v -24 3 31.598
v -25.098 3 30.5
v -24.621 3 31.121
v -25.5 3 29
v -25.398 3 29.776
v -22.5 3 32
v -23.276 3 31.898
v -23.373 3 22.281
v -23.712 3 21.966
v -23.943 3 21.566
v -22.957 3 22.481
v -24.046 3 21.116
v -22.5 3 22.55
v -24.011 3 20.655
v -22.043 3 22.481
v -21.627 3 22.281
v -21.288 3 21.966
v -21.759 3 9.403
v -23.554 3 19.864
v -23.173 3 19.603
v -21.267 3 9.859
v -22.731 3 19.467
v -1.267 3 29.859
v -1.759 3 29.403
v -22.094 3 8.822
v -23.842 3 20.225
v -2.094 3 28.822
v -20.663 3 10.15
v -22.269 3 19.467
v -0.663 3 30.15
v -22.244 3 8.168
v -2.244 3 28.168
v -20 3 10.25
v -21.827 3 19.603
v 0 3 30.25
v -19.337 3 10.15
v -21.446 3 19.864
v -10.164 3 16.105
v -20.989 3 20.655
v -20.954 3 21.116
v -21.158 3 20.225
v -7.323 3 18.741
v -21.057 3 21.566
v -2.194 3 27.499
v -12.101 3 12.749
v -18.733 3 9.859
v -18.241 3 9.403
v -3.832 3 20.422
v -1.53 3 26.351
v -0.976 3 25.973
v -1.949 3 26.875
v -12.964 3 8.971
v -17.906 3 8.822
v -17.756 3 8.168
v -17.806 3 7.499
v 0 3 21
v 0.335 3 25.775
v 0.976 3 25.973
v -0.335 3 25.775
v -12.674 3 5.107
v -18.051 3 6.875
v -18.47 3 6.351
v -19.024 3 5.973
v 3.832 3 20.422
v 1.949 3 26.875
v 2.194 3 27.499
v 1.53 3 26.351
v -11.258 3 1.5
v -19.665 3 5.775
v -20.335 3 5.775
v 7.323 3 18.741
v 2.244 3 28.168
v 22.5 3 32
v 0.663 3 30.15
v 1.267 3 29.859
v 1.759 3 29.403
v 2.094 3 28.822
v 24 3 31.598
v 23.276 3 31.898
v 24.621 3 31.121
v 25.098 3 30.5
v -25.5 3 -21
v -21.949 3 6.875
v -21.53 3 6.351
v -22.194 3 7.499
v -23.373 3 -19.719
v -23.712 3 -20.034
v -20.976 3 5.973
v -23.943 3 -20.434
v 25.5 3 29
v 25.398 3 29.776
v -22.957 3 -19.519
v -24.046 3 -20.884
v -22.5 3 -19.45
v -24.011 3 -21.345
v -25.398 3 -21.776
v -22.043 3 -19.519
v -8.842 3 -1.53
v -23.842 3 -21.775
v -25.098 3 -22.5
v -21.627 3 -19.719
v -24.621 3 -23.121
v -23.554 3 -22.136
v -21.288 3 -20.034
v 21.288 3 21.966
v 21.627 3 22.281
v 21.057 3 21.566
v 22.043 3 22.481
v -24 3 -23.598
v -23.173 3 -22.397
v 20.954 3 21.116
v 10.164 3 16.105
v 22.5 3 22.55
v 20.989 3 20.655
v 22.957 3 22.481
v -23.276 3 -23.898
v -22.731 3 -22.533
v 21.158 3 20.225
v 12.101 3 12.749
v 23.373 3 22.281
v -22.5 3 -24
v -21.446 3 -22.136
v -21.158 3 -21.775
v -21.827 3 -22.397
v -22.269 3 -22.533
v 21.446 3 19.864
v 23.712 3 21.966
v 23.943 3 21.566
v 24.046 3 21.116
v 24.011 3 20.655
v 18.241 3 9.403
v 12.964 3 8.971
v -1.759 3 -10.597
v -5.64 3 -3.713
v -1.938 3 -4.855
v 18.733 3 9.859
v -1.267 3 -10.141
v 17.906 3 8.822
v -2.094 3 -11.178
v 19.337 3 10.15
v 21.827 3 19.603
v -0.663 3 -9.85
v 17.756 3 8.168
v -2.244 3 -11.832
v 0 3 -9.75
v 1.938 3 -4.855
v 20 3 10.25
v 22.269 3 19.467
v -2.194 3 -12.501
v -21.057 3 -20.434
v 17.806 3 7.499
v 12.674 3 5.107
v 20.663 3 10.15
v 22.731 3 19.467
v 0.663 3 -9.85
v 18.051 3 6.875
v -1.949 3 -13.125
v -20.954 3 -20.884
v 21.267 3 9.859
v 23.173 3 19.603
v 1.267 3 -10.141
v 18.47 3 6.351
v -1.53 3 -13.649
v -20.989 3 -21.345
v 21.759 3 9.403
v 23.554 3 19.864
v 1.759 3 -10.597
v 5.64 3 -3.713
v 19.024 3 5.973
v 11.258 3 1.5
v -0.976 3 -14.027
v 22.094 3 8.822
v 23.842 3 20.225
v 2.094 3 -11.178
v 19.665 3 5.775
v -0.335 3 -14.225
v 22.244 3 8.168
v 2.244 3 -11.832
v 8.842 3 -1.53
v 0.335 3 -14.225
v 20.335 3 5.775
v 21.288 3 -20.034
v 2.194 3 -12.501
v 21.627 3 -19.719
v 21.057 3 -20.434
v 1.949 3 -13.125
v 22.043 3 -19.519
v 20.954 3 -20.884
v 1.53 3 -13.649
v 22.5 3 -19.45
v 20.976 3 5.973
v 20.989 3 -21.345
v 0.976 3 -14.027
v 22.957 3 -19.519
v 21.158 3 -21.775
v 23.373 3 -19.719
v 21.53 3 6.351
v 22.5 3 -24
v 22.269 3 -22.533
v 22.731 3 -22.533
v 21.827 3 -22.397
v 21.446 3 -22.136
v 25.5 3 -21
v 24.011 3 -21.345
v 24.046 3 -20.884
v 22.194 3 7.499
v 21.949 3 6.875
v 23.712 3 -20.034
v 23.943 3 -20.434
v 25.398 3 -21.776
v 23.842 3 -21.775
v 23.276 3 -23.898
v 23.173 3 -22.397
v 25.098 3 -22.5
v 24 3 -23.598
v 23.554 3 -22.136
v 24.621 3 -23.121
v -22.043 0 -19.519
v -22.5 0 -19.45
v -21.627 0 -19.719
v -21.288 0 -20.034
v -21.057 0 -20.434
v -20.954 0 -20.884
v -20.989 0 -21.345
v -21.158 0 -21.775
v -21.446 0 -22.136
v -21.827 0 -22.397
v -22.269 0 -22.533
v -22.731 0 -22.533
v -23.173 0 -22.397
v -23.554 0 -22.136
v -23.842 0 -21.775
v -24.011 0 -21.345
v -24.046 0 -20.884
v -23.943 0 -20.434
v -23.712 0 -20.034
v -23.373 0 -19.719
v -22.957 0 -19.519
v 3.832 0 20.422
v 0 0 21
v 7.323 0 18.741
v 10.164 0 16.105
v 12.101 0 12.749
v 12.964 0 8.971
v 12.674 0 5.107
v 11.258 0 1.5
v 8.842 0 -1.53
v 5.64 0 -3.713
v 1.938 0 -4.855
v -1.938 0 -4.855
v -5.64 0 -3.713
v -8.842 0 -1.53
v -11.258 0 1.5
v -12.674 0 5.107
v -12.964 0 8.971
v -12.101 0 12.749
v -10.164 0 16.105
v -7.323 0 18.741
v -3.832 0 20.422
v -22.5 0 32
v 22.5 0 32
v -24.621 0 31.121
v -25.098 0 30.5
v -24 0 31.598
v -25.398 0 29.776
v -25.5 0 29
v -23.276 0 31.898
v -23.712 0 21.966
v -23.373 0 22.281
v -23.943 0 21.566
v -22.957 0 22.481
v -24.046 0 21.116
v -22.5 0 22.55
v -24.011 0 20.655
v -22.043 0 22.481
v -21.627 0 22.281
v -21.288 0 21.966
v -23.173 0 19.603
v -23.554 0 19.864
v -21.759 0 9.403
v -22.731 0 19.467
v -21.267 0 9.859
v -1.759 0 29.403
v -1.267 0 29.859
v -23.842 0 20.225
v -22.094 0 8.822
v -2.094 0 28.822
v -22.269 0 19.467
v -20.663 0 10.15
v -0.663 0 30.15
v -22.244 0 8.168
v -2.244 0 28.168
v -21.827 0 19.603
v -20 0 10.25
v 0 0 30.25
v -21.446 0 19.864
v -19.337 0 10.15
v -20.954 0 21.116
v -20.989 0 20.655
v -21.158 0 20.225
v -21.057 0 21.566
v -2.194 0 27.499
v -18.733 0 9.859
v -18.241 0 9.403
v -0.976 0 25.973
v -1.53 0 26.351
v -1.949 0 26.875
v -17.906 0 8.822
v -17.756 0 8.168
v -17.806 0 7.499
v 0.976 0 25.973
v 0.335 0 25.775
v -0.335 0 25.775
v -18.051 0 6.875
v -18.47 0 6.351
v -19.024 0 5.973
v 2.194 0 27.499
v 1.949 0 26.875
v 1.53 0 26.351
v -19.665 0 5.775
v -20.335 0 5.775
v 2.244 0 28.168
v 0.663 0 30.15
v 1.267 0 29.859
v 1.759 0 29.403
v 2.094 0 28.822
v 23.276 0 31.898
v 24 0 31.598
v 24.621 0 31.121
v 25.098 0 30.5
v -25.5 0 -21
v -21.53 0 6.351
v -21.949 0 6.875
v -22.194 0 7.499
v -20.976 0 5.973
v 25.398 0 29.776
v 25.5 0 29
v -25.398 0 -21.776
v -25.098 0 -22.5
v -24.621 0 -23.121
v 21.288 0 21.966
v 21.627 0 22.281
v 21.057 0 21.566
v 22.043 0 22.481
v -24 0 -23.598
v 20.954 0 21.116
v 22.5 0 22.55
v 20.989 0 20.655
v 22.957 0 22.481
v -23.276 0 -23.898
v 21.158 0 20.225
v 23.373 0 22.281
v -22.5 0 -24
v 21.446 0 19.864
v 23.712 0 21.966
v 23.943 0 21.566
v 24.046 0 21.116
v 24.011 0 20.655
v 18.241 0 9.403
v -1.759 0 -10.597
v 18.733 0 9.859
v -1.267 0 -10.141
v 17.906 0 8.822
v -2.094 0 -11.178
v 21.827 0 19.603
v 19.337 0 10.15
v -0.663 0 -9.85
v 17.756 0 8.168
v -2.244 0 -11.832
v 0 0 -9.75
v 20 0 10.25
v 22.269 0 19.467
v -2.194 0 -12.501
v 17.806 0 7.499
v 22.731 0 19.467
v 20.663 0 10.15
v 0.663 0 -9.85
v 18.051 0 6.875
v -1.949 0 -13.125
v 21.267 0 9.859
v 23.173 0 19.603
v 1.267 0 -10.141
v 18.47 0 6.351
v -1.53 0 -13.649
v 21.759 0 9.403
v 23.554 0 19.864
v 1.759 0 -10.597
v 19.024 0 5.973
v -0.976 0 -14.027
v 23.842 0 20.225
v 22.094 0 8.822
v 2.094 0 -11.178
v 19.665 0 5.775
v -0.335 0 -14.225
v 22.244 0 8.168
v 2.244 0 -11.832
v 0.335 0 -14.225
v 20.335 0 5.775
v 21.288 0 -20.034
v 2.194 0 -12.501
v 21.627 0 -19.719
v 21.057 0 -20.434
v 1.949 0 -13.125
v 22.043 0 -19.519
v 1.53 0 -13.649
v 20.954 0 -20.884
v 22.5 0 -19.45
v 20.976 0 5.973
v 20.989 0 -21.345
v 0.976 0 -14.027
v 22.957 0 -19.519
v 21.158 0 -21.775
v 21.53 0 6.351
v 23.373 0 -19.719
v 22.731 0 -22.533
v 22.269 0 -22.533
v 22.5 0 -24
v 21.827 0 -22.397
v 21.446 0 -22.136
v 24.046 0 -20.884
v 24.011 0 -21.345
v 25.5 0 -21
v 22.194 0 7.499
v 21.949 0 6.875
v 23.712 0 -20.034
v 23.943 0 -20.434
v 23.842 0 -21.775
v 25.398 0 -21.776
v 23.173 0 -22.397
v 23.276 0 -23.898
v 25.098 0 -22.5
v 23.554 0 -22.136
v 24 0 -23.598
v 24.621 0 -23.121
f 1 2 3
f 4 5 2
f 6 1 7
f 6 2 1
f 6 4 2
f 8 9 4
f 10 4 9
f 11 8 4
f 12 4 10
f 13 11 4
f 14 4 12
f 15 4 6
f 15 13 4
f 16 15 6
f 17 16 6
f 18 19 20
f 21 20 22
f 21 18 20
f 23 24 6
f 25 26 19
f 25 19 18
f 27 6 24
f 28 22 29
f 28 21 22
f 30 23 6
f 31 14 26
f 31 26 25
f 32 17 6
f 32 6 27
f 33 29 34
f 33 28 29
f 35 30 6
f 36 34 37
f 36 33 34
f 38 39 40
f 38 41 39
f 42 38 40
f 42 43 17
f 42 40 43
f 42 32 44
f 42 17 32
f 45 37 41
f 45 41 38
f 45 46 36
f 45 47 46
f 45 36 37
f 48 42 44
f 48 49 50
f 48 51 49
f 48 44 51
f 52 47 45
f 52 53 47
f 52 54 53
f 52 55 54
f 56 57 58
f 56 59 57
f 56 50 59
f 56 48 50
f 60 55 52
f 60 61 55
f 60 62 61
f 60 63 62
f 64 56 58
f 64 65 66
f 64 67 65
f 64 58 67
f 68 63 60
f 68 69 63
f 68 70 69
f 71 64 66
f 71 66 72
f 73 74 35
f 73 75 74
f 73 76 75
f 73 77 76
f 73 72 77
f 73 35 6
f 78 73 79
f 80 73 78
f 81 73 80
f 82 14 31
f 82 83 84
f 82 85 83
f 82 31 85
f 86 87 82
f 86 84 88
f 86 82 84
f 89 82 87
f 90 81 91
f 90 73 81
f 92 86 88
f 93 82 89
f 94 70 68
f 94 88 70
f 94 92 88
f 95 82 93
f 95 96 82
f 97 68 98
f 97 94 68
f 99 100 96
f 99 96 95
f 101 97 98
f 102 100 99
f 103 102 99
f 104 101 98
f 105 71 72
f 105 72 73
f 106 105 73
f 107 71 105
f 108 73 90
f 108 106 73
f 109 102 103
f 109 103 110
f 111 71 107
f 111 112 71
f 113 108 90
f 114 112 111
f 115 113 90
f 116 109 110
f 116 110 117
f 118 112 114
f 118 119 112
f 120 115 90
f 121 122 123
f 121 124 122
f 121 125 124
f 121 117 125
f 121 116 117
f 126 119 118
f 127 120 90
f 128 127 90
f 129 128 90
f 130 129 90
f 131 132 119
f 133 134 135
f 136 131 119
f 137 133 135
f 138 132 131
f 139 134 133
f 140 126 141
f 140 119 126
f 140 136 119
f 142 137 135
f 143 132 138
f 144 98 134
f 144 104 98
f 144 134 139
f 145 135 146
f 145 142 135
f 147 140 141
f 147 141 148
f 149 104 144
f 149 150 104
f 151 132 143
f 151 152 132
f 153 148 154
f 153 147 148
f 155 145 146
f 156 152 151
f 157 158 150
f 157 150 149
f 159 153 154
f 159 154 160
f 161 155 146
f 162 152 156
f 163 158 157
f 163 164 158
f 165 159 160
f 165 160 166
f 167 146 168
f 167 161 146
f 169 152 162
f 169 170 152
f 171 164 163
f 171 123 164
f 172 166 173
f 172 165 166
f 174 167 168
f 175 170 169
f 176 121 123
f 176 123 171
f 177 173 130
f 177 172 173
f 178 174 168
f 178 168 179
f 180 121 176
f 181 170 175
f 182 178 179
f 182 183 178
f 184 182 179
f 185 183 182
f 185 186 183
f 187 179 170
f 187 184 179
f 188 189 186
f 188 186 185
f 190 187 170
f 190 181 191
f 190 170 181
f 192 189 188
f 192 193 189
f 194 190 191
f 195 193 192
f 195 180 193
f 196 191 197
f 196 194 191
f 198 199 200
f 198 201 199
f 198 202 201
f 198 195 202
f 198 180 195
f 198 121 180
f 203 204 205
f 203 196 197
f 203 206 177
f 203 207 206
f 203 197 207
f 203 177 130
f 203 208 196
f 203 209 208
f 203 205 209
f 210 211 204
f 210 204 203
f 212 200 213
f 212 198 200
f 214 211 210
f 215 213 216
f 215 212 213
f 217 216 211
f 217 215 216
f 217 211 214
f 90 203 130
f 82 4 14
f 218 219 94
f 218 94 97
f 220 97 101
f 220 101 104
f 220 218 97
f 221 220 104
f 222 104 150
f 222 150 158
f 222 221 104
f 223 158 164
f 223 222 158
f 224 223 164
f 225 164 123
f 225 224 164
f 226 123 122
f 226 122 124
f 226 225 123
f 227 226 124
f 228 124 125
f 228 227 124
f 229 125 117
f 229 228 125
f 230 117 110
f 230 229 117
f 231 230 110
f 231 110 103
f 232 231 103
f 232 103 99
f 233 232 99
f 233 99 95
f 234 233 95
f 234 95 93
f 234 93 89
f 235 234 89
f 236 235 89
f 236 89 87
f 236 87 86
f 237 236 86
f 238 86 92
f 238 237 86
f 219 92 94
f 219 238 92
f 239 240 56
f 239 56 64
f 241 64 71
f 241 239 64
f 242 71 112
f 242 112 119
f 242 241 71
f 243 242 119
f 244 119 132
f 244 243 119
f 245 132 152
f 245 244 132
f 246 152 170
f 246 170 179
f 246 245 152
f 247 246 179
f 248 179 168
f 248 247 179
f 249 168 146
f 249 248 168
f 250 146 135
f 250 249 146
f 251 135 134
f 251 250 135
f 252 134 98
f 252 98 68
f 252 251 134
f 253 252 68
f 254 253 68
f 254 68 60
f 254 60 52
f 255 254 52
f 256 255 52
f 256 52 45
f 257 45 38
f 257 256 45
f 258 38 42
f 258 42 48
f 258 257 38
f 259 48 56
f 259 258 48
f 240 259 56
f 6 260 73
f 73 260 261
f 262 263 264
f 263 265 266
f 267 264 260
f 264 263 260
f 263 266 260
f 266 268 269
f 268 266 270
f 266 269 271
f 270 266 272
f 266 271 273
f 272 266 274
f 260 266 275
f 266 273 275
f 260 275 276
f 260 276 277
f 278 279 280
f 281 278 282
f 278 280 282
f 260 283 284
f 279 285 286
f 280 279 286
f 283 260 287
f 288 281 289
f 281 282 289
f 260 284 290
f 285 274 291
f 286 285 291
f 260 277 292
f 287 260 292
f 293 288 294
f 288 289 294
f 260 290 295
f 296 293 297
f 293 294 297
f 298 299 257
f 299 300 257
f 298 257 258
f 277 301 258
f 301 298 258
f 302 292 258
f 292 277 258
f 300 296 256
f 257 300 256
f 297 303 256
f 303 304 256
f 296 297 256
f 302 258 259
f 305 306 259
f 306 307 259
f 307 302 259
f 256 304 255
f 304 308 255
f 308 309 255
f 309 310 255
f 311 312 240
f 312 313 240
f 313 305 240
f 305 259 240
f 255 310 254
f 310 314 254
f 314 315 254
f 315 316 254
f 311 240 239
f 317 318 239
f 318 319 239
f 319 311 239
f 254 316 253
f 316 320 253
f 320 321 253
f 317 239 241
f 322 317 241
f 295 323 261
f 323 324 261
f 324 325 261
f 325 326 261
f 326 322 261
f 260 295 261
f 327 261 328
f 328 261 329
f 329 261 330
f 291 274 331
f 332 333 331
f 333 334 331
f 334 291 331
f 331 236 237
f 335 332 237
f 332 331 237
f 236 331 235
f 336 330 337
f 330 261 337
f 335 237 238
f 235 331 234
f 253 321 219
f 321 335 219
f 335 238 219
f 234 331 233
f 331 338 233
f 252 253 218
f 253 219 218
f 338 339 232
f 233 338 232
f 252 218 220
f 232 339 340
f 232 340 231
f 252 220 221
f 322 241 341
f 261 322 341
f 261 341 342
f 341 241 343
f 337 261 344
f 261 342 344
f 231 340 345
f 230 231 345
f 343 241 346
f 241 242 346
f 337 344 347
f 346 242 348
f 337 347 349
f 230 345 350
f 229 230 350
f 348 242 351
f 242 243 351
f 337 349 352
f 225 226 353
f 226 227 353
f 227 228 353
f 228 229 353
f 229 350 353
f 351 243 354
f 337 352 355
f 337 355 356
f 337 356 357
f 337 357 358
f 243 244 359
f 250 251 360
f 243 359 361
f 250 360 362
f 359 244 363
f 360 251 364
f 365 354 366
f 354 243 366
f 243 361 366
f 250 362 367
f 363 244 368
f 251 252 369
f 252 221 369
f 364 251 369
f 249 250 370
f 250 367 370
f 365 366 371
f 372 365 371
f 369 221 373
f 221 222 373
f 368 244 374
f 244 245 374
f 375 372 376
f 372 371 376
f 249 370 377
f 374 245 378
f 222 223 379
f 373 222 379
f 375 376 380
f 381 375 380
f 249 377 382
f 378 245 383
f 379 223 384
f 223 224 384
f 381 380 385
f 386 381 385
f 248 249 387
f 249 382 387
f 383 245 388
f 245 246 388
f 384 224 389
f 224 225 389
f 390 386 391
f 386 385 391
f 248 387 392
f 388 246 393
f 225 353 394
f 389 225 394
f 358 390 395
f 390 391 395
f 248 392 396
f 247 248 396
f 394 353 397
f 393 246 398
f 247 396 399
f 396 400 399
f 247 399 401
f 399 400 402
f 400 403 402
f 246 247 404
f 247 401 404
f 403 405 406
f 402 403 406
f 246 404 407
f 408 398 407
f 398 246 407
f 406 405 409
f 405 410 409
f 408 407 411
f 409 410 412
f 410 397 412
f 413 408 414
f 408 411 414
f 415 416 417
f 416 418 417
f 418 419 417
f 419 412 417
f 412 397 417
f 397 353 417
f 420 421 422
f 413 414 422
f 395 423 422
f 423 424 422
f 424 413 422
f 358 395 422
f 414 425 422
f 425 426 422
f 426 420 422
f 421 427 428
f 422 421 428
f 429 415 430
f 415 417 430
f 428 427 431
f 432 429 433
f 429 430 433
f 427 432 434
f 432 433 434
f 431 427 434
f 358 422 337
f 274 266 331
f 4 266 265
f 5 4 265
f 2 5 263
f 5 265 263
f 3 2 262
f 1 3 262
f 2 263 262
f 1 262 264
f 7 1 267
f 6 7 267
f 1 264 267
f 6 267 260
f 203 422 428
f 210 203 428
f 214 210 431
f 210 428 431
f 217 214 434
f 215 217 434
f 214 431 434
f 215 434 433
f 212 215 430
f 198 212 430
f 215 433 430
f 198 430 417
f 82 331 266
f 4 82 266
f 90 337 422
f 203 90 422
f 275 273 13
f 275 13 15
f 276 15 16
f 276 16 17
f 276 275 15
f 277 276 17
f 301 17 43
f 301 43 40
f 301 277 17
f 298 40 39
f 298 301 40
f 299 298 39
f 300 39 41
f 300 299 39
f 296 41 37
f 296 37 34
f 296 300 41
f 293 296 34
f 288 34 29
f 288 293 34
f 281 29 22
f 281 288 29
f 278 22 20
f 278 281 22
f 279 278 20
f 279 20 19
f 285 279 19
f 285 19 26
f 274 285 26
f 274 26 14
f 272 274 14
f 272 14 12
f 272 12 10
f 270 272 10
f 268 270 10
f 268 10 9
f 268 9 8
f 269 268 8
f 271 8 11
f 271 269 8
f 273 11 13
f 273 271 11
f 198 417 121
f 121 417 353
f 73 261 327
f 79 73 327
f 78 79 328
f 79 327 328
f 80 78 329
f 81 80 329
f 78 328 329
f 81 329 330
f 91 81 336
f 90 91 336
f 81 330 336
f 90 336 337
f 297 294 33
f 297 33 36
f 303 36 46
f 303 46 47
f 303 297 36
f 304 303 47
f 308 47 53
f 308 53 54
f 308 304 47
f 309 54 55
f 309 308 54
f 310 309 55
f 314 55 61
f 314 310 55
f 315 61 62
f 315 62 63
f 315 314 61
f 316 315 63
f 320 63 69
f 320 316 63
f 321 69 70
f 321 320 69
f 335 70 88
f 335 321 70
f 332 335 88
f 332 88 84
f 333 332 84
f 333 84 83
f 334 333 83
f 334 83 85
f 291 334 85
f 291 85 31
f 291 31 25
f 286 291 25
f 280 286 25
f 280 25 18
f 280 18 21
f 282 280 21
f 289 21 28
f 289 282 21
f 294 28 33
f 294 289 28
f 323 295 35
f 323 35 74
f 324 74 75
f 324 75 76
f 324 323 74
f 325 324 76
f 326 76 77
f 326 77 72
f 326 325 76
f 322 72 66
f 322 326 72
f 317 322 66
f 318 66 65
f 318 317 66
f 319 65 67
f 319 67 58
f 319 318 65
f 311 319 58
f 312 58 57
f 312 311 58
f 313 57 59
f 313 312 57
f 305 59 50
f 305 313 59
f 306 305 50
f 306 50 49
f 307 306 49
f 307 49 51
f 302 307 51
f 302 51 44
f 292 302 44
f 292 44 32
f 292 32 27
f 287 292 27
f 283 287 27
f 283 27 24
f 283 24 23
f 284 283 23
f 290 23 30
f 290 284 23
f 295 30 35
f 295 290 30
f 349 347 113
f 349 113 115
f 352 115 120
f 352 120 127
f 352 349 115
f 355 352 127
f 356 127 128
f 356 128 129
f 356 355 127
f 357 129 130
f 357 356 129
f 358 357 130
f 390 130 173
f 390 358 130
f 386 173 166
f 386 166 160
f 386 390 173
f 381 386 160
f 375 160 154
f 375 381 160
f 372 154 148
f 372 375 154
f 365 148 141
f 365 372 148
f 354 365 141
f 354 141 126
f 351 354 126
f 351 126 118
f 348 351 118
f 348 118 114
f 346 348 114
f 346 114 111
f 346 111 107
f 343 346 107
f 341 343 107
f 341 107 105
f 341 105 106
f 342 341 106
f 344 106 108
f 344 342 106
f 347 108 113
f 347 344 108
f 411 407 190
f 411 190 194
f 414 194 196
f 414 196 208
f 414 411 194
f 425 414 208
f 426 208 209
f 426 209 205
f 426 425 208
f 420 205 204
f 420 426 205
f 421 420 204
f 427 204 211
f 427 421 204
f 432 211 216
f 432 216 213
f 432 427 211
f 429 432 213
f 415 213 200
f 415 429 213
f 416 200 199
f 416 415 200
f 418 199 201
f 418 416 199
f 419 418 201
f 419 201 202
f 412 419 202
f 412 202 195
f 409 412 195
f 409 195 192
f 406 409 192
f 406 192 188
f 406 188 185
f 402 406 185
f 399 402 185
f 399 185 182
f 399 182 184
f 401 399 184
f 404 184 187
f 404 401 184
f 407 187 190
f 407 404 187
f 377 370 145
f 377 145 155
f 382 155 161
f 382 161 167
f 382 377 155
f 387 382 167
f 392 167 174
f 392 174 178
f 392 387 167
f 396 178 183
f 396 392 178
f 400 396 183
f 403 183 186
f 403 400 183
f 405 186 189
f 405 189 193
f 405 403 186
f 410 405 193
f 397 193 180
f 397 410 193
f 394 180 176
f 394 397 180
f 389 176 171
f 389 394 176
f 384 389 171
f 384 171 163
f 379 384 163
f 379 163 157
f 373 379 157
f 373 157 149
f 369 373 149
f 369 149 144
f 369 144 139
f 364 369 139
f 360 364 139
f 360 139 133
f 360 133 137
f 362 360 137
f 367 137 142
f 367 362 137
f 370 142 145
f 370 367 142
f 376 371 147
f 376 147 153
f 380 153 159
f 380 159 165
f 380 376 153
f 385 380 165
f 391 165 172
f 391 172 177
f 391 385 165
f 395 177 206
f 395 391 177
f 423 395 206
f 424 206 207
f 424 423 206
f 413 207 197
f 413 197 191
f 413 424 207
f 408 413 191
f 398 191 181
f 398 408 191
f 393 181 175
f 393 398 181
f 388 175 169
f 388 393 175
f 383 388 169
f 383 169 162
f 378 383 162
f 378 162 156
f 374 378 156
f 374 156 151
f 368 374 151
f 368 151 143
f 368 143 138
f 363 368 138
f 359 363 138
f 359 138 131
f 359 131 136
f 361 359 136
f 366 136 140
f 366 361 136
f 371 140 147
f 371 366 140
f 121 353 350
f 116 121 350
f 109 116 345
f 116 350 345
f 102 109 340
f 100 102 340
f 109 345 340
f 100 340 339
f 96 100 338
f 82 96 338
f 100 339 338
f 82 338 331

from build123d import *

# Parameters (mm, degrees)
SKETCH1_R         = 1.55
SKETCH1_R_2       = 2.25
SKETCH1_R_3       = 13
MOTOR_PLATE_DEPTH = 3


with BuildPart() as part:
    # Sketch1 → Motor_Plate (new body)
    with BuildSketch(Plane(origin=(0, 0, 0), x_dir=(1, 0, 0), z_dir=(0, 1, 0))):
        with BuildLine():
            Line((25.5, -29), (25.5, 21))
            ThreePointArc((25.5, 21), (24.621320344, 23.121320344), (22.5, 24))
            Line((22.5, 24), (-22.5, 24))
            ThreePointArc((-22.5, 24), (-24.621320344, 23.121320344), (-25.5, 21))
            Line((-25.5, 21), (-25.5, -29))
            ThreePointArc((-25.5, -29), (-24.621320344, -31.121320344), (-22.5, -32))
            Line((-22.5, -32), (22.5, -32))
            ThreePointArc((22.5, -32), (24.621320344, -31.121320344), (25.5, -29))
        make_face()
        with Locations(Location((22.5, -21, 0), (0, 0, 270))):
            Circle(SKETCH1_R, mode=Mode.SUBTRACT)
        with Locations(Location((-22.5, -21, 0), (0, 0, 270))):
            Circle(SKETCH1_R, mode=Mode.SUBTRACT)
        with Locations(Location((0, -28, 0), (0, 0, 270))):
            Circle(SKETCH1_R_2, mode=Mode.SUBTRACT)
        with Locations(Location((0, 12, 0), (0, 0, 270))):
            Circle(SKETCH1_R_2, mode=Mode.SUBTRACT)
        with Locations(Location((-22.5, 21, 0), (0, 0, 270))):
            Circle(SKETCH1_R, mode=Mode.SUBTRACT)
        with Locations(Location((20, -8, 0), (0, 0, 270))):
            Circle(SKETCH1_R_2, mode=Mode.SUBTRACT)
        with Locations(Location((22.5, 21, 0), (0, 0, 270))):
            Circle(SKETCH1_R, mode=Mode.SUBTRACT)
        with Locations(Location((-20, -8, 0), (0, 0, 270))):
            Circle(SKETCH1_R_2, mode=Mode.SUBTRACT)
        with Locations(Location((0, -8, 0), (0, 0, 270))):
            Circle(SKETCH1_R_3, mode=Mode.SUBTRACT)
    extrude(amount=MOTOR_PLATE_DEPTH)


solid = part.part
